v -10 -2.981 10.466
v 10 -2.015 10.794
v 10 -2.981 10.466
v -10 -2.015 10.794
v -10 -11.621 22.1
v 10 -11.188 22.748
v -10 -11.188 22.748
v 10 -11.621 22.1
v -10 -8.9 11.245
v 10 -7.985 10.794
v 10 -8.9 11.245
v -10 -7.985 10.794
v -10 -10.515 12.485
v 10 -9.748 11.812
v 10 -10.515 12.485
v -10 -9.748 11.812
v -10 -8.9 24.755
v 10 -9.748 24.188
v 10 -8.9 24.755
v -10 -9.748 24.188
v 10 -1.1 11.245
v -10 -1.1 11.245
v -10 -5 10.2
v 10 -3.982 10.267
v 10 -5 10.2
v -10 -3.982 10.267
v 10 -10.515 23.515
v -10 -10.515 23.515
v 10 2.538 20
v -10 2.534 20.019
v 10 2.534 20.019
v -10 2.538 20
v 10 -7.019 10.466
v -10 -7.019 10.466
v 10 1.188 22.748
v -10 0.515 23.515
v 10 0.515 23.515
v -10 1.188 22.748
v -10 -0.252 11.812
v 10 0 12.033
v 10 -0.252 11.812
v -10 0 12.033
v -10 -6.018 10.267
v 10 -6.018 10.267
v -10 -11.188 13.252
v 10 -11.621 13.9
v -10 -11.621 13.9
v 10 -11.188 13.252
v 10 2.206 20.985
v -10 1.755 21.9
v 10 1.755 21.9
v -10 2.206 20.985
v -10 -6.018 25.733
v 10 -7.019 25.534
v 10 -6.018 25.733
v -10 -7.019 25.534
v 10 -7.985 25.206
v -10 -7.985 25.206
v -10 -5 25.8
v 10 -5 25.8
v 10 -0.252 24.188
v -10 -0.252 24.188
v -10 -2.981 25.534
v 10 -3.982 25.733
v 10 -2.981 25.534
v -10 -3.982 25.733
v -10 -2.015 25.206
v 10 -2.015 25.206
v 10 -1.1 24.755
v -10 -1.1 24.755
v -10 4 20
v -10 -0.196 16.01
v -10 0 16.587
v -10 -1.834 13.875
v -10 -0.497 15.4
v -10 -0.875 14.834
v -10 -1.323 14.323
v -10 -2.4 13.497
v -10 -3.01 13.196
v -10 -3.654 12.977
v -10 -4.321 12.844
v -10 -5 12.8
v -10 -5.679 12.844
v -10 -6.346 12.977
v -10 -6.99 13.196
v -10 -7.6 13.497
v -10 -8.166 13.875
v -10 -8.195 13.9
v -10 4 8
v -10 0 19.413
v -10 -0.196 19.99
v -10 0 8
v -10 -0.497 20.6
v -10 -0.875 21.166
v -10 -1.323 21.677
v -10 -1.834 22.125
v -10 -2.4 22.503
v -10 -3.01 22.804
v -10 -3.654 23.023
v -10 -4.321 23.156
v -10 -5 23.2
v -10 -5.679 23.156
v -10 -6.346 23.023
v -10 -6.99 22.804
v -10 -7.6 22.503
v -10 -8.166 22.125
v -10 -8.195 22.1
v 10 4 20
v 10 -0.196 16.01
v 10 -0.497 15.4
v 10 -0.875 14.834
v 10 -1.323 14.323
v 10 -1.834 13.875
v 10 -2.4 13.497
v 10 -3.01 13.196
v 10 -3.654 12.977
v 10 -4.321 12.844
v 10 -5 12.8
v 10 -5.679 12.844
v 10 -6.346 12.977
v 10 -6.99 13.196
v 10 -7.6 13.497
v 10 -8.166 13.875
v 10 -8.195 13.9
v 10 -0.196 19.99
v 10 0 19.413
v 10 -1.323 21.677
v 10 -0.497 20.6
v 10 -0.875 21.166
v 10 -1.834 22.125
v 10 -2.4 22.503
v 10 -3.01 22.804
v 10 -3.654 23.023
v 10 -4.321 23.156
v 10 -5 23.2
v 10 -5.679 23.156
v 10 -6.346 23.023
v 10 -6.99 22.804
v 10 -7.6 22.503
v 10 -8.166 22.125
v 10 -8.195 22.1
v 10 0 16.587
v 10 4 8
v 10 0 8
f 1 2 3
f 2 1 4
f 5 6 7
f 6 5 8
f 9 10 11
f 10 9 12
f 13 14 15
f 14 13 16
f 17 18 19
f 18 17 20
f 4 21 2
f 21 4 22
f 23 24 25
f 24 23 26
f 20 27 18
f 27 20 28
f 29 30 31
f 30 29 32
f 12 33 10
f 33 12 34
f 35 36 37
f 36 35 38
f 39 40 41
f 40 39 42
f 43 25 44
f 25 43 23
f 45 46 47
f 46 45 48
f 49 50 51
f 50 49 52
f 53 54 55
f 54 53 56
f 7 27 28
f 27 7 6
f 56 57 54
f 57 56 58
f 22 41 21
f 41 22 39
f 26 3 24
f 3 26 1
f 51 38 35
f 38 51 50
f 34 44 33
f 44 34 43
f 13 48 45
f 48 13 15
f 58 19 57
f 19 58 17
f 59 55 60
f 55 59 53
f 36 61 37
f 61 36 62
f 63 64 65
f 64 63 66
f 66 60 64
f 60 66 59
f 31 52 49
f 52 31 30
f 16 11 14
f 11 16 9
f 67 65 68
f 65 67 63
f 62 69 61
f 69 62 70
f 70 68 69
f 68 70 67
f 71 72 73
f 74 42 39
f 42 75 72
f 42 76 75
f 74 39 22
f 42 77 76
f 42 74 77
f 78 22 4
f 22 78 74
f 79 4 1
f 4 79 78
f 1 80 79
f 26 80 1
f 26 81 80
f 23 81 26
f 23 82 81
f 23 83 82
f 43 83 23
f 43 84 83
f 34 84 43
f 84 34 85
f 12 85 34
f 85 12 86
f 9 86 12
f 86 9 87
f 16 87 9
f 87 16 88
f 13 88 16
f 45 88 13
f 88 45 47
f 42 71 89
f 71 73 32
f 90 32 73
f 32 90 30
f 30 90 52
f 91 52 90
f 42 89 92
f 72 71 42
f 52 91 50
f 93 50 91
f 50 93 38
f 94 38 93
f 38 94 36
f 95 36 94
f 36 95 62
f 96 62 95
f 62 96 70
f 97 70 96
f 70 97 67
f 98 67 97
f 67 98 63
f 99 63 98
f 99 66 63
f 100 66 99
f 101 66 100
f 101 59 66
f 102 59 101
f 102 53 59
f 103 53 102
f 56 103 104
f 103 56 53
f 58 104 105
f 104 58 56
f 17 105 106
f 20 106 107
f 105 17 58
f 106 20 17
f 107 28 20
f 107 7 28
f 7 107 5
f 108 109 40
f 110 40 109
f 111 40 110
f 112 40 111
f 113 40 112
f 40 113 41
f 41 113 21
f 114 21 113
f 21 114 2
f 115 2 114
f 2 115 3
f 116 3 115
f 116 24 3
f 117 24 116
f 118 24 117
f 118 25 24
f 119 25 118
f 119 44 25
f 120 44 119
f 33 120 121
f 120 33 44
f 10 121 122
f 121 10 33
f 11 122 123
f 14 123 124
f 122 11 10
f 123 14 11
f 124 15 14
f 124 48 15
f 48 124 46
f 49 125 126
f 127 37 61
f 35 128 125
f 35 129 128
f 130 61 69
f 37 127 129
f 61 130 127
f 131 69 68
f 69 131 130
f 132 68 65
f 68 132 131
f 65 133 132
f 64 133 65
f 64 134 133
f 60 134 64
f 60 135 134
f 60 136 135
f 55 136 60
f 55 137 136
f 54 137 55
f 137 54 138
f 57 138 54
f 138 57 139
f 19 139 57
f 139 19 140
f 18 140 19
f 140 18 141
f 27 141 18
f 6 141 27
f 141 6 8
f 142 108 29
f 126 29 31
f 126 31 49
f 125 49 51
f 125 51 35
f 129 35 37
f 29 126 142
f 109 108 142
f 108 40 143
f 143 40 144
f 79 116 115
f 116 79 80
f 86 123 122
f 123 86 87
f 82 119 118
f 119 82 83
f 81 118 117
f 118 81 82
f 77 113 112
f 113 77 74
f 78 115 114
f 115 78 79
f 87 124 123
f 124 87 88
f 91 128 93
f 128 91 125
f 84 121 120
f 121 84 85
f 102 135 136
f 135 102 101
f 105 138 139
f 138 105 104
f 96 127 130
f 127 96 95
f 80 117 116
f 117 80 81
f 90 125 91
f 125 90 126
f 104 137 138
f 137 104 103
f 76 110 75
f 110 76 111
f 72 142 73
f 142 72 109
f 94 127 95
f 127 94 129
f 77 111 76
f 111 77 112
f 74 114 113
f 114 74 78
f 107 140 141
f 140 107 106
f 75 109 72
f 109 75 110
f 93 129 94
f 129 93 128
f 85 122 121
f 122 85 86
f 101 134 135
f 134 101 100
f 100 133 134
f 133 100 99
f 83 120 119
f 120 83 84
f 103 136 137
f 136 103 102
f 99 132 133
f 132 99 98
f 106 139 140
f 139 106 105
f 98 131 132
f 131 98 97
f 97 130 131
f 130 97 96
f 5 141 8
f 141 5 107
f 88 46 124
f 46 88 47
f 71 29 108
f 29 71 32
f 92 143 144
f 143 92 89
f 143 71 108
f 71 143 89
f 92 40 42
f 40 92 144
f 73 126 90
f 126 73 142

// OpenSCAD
// HUB75 display frame - V1.2 V1.1-style tube clip
//
// Self-contained component.
// No project_config.scad dependency.
//
// Coordinate system:
// X = tube direction
// Y = front/rear
// Z = vertical
//
// The C-opening points away from the plate in -Y.

 /* [Clip] */
clip_length = 20.0;
clip_wall = 2.6;
clip_inner_diameter = 10.4;
clip_opening = 8.2;

 /* [Attachment] */
clip_plate_overlap = 1.4;
clip_vertical_overlap = 2.0;
attachment_thickness = 4.0;
attachment_plate_height = 24.0;

 /* [Standalone preview] */
preview_edge = "top"; // [top, bottom]
preview_center_x = 0.0;
preview_tube_z = 18.0;
preview_tube_y = -5.0;
preview_color = [0.86, 0.08, 0.05, 1];

 /* [Resolution] */
$fn = 48;


function clip_outer_diameter(
    inner_diameter,
    wall
) =
    inner_diameter + 2 * wall;


function clip_outer_radius(
    inner_diameter,
    wall
) =
    clip_outer_diameter(
        inner_diameter,
        wall
    ) / 2;


module tube_snap_clip(
    center_x = 0,
    local_tube_y = -5,
    local_tube_z = 18,
    length = clip_length,
    wall = clip_wall,
    inner_diameter = clip_inner_diameter,
    opening = clip_opening,
    part_color = preview_color
) {
    outer_d =
        clip_outer_diameter(
            inner_diameter,
            wall
        );

    outer_r =
        outer_d / 2;

    color(part_color)
        difference() {
            translate([
                center_x,
                local_tube_y,
                local_tube_z
            ])
                rotate([0, 90, 0])
                    cylinder(
                        h=length,
                        d=outer_d,
                        center=true,
                        $fn=48
                    );

            translate([
                center_x,
                local_tube_y,
                local_tube_z
            ])
                rotate([0, 90, 0])
                    cylinder(
                        h=length + 0.4,
                        d=inner_diameter,
                        center=true,
                        $fn=48
                    );

            // V1.1 orientation: opening away from the plate (-Y).
            translate([
                center_x - length/2 - 0.3,
                local_tube_y - outer_r - 0.6,
                local_tube_z - opening/2
            ])
                cube([
                    length + 0.6,
                    outer_r + 0.6,
                    opening
                ]);
        }
}


module tube_clip_extension(
    center_x = 0,
    edge = "top",
    local_tube_z = 18,
    length = clip_length,
    thickness = attachment_thickness,
    plate_height = attachment_plate_height,
    vertical_overlap = clip_vertical_overlap,
    part_color = preview_color
) {
    color(part_color)
        if(edge == "top")
            translate([
                center_x - length/2,
                0,
                plate_height/2 - thickness
            ])
                cube([
                    length,
                    thickness,
                    (local_tube_z + vertical_overlap)
                        - (plate_height/2 - thickness)
                ]);
        else
            translate([
                center_x - length/2,
                0,
                local_tube_z - vertical_overlap
            ])
                cube([
                    length,
                    thickness,
                    (-plate_height/2 + thickness)
                        - (local_tube_z - vertical_overlap)
                ]);
}


module tube_clip_with_extension(
    center_x = 0,
    edge = "top",
    local_tube_y = -5,
    local_tube_z = 18,
    length = clip_length,
    wall = clip_wall,
    inner_diameter = clip_inner_diameter,
    opening = clip_opening,
    thickness = attachment_thickness,
    plate_height = attachment_plate_height,
    vertical_overlap = clip_vertical_overlap,
    part_color = preview_color
) {
    union() {
        tube_snap_clip(
            center_x=center_x,
            local_tube_y=local_tube_y,
            local_tube_z=local_tube_z,
            length=length,
            wall=wall,
            inner_diameter=inner_diameter,
            opening=opening,
            part_color=part_color
        );

        tube_clip_extension(
            center_x=center_x,
            edge=edge,
            local_tube_z=local_tube_z,
            length=length,
            thickness=thickness,
            plate_height=plate_height,
            vertical_overlap=vertical_overlap,
            part_color=part_color
        );
    }
}


// Standalone preview
tube_clip_with_extension(
    center_x=preview_center_x,
    edge=preview_edge,
    local_tube_y=preview_tube_y,
    local_tube_z=preview_tube_z
);
